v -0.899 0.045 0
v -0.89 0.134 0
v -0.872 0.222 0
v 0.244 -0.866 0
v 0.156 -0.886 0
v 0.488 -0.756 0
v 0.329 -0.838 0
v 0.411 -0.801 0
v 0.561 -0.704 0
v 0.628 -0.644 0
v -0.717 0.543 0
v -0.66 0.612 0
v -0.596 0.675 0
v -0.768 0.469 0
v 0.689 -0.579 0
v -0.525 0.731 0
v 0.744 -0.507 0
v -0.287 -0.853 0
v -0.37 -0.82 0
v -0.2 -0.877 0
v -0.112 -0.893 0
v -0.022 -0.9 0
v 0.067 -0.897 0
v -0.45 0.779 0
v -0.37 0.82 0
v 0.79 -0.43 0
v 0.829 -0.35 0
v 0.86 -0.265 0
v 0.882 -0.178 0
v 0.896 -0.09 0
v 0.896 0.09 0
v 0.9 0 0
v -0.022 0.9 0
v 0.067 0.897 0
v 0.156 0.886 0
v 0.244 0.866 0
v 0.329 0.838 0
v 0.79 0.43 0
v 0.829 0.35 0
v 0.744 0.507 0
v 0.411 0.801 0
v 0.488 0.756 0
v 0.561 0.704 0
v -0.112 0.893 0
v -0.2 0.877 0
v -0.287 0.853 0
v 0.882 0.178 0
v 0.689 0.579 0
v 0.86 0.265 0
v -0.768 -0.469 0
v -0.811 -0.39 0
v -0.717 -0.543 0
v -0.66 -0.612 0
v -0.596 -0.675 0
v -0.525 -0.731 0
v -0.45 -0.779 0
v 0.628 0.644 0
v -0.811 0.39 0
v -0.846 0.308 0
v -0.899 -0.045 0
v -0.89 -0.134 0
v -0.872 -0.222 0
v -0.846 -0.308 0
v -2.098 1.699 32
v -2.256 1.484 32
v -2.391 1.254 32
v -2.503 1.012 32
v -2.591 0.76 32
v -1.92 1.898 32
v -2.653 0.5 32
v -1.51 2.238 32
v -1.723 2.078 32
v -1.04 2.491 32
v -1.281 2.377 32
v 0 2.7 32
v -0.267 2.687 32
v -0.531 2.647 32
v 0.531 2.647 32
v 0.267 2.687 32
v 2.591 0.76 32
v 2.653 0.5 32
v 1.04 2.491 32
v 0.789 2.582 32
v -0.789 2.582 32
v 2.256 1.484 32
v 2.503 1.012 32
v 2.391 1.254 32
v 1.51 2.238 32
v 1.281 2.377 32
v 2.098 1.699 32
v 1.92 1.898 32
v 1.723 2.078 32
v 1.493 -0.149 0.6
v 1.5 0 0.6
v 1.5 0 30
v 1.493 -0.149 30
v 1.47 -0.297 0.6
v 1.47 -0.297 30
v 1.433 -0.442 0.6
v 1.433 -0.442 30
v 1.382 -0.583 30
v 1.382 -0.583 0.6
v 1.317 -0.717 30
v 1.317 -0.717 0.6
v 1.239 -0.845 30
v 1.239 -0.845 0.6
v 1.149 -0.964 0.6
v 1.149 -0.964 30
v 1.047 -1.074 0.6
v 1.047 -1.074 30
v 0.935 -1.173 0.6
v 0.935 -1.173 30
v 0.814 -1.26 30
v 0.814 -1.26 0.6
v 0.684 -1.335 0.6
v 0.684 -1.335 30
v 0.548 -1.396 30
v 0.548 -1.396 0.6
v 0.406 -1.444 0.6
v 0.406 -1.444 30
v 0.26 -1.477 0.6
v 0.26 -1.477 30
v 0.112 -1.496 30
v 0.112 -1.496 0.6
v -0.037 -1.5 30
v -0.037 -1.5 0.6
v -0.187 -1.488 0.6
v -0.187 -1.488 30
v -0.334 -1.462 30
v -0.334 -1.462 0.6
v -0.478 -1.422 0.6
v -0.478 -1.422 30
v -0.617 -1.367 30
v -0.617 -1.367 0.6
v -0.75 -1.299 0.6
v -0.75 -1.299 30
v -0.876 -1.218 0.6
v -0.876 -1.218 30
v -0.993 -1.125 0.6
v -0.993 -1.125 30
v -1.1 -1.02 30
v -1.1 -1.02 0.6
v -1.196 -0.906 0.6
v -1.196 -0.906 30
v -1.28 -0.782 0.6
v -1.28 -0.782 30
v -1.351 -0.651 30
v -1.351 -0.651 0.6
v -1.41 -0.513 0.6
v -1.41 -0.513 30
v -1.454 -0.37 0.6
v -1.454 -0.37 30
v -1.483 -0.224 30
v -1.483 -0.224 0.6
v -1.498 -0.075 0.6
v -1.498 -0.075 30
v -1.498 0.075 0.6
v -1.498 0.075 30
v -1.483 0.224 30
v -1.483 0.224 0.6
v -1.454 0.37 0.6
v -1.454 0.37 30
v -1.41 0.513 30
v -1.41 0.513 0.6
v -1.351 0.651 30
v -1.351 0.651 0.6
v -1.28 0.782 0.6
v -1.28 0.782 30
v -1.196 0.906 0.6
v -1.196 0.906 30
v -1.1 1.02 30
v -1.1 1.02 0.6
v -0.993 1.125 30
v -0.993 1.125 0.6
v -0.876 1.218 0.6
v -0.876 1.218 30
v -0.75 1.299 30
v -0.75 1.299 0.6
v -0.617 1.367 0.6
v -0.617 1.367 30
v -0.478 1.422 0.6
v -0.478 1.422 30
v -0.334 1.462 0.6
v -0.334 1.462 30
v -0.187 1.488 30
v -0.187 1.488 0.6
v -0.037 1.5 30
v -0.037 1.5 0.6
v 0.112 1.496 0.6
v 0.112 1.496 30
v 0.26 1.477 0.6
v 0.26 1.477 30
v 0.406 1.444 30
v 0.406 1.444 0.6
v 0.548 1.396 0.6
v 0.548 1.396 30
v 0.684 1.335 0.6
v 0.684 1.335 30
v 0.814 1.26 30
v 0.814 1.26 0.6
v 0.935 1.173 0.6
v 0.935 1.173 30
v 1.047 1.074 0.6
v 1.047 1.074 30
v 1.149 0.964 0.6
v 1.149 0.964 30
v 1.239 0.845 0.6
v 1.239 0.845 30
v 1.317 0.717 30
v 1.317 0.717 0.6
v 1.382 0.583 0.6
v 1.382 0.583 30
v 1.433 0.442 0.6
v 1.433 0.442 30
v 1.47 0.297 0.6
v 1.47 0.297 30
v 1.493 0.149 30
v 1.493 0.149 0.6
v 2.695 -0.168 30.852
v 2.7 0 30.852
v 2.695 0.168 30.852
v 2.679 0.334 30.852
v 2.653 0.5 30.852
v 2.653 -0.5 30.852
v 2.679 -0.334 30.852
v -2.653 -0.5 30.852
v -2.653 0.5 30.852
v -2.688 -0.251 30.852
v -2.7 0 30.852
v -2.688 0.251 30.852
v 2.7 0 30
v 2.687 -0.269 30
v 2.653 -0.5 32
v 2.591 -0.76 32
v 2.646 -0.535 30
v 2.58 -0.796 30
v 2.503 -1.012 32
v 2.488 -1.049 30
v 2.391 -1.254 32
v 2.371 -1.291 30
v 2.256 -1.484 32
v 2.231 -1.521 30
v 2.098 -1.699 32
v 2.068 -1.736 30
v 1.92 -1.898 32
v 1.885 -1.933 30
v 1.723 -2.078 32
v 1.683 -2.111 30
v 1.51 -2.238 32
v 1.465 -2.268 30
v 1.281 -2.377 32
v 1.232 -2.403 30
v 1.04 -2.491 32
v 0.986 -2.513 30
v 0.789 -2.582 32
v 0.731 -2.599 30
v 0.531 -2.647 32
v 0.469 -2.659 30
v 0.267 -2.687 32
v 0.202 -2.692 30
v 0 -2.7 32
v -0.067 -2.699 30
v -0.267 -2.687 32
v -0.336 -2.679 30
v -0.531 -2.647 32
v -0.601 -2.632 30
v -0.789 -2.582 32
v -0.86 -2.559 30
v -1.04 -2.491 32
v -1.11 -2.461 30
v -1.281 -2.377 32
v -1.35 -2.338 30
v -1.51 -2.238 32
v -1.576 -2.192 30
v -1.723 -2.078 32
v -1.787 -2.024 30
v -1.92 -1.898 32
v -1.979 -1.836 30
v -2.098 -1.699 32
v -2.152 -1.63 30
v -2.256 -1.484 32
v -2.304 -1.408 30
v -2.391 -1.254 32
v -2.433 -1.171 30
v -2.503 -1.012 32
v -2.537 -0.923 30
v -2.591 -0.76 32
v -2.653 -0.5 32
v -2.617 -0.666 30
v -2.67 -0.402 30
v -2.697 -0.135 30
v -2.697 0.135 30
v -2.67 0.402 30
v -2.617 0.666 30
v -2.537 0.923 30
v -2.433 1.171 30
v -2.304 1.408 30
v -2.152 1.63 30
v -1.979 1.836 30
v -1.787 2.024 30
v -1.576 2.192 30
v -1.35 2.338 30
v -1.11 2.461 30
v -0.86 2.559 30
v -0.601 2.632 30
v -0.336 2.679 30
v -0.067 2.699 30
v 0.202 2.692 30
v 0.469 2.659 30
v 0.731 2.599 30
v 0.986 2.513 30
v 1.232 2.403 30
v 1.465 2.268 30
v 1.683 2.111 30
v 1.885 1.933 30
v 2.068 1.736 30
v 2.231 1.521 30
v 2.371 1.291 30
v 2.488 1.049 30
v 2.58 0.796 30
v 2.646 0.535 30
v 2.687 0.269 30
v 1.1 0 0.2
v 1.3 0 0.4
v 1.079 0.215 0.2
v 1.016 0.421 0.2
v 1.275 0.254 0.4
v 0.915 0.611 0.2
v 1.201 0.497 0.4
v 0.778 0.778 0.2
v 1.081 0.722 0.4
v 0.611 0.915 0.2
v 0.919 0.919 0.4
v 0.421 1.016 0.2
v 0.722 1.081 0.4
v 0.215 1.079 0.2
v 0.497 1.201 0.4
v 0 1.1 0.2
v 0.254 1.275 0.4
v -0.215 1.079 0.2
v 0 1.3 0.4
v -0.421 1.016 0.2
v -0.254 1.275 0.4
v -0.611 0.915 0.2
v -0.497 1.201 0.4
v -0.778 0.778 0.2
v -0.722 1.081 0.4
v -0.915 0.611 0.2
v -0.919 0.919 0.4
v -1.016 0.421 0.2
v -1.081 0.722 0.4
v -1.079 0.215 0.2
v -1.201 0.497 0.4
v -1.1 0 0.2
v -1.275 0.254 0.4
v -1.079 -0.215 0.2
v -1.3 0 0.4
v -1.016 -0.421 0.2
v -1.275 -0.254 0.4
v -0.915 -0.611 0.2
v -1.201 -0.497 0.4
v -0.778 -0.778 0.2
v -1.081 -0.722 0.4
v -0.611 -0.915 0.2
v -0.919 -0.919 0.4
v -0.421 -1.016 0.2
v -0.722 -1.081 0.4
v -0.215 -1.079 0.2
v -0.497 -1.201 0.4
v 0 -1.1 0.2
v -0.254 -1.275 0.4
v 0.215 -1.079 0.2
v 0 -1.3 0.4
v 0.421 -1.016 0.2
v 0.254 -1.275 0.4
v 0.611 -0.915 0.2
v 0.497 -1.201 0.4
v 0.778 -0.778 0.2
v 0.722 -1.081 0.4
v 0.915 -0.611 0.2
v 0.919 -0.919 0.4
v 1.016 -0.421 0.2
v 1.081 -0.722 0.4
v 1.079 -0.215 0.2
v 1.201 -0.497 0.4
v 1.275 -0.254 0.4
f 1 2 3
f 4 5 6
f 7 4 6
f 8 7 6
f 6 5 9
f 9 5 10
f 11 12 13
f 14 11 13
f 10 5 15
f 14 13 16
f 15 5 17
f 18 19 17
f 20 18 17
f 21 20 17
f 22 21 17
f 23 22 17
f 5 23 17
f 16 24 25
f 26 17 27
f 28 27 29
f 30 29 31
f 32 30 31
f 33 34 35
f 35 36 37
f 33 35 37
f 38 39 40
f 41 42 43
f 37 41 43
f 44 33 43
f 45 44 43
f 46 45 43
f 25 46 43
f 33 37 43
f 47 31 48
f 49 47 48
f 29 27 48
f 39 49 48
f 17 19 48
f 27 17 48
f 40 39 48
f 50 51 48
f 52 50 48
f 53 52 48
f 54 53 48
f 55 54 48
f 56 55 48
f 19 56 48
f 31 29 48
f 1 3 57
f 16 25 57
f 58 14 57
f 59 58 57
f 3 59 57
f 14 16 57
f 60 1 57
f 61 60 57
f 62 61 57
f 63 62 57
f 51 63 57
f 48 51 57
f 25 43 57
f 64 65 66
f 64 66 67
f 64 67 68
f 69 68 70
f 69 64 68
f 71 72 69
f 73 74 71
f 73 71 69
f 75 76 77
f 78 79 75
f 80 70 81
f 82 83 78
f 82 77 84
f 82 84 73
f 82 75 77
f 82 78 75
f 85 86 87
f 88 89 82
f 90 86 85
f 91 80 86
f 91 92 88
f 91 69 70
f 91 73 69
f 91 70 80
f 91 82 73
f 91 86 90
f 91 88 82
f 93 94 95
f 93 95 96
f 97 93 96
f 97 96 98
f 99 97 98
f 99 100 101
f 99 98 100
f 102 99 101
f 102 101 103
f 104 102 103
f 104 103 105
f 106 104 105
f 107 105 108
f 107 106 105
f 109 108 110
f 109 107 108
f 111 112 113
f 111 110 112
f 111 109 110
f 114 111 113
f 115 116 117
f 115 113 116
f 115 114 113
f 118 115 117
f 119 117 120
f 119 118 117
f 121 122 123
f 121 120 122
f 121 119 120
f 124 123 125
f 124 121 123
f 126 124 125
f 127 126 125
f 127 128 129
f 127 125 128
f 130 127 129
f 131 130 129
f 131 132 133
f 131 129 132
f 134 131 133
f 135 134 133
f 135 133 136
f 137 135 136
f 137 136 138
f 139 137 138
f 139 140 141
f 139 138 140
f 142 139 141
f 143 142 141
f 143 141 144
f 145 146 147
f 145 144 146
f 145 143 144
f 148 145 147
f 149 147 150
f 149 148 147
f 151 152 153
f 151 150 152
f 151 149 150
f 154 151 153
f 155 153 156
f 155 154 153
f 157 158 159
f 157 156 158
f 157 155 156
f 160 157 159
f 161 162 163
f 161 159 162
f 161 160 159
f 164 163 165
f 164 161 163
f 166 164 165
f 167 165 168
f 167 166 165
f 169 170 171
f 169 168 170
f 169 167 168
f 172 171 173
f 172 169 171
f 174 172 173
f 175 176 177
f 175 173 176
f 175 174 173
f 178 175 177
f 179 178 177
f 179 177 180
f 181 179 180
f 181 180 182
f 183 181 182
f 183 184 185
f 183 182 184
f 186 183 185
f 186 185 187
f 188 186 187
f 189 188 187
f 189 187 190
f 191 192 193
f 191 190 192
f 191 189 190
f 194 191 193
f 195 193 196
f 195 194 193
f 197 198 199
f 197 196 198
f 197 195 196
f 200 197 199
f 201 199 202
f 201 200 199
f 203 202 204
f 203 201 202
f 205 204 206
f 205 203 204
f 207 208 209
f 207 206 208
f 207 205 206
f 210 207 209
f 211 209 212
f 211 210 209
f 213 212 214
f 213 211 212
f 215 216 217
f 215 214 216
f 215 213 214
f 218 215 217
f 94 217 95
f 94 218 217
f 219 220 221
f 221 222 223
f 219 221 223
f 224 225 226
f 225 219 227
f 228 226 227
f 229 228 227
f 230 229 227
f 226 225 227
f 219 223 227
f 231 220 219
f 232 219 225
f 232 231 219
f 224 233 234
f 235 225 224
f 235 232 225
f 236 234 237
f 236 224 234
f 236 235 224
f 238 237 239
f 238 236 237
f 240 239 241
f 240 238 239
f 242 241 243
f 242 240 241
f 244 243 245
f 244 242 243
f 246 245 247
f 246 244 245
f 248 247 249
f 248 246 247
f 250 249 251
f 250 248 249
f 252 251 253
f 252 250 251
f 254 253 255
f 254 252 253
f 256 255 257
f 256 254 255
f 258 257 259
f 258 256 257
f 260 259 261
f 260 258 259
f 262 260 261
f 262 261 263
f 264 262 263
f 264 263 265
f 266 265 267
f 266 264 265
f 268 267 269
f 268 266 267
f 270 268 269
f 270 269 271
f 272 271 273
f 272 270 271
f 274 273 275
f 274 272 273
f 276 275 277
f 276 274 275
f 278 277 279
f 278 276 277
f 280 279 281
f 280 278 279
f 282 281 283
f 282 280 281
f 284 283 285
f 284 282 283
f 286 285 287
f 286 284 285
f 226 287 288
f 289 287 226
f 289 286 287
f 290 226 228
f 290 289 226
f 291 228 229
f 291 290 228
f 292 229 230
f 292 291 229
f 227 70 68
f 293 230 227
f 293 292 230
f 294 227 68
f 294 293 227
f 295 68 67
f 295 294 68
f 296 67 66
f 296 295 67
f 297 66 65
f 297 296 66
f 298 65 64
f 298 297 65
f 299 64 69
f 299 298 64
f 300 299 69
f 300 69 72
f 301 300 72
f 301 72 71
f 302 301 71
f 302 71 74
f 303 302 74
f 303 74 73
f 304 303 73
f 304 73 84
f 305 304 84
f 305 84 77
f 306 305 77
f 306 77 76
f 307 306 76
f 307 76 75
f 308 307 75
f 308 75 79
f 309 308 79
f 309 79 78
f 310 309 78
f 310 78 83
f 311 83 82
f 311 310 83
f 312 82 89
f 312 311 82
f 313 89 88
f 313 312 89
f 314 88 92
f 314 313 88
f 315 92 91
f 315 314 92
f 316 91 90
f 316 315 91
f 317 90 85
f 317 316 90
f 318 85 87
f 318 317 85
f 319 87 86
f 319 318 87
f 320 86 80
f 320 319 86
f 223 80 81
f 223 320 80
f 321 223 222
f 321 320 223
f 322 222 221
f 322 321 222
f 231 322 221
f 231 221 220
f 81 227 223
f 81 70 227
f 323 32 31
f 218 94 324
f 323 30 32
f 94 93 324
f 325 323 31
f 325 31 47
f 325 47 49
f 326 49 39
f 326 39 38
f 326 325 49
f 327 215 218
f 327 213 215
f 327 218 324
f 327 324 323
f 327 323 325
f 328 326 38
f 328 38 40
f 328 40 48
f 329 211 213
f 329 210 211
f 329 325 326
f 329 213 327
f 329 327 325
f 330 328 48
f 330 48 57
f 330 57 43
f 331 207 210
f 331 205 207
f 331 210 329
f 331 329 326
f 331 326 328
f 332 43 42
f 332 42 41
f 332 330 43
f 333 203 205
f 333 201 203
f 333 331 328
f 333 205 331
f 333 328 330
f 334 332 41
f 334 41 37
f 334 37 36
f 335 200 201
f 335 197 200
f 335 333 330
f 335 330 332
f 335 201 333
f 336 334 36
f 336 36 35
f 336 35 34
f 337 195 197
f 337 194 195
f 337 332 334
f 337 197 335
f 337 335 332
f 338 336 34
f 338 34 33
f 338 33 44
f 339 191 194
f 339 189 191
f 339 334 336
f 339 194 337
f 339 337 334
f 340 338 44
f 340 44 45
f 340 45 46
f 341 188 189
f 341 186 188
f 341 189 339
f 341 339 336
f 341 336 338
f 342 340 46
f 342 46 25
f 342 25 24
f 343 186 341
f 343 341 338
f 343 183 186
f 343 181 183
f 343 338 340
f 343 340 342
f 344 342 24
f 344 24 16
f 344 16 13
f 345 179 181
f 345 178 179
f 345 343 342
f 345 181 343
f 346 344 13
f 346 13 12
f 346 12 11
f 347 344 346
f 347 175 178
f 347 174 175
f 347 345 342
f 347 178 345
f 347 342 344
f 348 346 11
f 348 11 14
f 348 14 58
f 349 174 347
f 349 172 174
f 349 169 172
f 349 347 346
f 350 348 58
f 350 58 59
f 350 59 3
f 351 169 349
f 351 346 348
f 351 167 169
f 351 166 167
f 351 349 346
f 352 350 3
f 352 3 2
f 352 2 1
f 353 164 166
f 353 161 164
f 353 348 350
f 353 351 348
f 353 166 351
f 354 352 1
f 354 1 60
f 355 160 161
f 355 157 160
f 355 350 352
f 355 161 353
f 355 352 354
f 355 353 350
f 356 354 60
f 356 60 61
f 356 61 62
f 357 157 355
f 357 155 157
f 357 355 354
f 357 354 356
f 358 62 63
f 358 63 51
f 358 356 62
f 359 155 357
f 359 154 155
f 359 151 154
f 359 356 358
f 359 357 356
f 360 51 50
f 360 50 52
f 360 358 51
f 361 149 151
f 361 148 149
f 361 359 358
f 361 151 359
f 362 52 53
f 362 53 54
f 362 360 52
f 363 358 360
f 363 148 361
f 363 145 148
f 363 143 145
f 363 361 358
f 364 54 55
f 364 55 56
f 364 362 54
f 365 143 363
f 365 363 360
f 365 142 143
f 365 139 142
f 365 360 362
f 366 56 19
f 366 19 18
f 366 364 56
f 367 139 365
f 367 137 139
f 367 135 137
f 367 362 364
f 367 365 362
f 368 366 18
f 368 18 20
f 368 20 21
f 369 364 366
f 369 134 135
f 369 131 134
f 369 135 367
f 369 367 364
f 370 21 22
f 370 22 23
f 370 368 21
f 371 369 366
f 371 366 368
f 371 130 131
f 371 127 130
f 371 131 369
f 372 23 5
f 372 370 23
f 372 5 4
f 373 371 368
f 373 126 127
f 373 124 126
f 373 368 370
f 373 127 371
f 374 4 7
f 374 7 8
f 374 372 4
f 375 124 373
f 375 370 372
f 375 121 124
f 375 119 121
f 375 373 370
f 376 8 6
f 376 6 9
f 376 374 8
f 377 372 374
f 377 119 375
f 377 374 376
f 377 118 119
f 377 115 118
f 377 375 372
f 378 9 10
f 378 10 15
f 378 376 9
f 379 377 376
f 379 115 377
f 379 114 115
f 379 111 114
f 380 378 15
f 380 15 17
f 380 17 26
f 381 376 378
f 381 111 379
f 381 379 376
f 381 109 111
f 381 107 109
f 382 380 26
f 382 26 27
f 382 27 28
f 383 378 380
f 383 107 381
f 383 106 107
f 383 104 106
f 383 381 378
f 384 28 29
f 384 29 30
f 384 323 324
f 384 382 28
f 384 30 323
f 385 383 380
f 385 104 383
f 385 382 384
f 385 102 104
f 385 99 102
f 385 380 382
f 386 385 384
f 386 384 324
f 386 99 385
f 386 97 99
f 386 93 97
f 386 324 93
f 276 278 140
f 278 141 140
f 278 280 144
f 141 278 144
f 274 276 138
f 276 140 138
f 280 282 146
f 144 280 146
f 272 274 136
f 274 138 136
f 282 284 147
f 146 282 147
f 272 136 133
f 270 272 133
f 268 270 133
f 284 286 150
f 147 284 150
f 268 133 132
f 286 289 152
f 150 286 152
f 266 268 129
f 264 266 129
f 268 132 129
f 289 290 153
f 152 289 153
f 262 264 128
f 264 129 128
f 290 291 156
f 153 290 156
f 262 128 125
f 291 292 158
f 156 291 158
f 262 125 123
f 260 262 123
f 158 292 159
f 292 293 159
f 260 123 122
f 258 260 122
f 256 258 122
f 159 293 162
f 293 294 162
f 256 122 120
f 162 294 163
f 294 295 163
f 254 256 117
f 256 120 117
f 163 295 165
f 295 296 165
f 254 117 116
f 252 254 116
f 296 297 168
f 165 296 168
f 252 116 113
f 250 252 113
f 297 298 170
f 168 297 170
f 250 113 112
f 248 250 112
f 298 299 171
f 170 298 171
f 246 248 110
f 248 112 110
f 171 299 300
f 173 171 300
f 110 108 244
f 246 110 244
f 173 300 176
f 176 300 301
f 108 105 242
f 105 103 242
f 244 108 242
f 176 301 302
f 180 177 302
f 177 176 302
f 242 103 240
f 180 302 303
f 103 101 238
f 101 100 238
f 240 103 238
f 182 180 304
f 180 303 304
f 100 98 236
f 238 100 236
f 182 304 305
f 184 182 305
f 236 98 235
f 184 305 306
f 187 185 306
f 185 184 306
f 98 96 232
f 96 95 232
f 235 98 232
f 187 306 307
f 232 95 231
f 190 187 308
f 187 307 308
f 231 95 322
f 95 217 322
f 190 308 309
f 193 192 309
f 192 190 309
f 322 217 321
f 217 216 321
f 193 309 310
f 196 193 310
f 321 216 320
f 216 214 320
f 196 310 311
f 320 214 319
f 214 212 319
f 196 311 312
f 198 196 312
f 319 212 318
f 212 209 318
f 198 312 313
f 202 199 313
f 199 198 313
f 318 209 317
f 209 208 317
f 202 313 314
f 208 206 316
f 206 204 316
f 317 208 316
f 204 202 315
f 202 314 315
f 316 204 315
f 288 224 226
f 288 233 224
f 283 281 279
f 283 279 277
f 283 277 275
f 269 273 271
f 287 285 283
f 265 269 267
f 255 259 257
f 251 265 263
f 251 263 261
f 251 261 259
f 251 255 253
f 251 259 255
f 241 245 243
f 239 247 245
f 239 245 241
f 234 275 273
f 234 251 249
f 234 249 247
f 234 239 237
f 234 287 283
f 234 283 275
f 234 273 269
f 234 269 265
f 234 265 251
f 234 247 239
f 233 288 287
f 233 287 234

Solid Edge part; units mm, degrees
sketch "Sketch1" plane through (0, 0, 0) normal (0, 0, 1) x (1, 0, 0)
  circle A0 centre (0, 0) radius 1.5
  dimension "D1" = 3
extrude "Protrusion1" add sketch "Sketch1" along normal blind 30
chamfer "Chaflán_1" distance 0.6 angle 45 1 edges at (-1.5, 0, 0)
sketch "Sketch2" plane through (0, 0, 30) normal (0, 0, 1) x (1, 0, 0)
  circle A0 centre (0, 0) radius 2.7
  dimension "D1" = 5.4
extrude "ProtrusiónExtruida_3" add sketch "Sketch2" along normal blind 2
sketch "Sketch3" plane through (0, 0, 32) normal (0, 0, 1) x (0, 1, 0)
  line L0 (0.5, -3.2084) -> (-0.5, -3.2084)
  line L1 (-0.5, -3.2084) -> (-0.5, 3.2084)
  line L2 (-0.5, 3.2084) -> (0.5, 3.2084)
  line L3 (0.5, 3.2084) -> (0.5, -3.2084)
  dimension "D1" = 0.5
extrude "VaciadoExtruido_5" cut sketch "Sketch3" against normal blind 1.148
properties material "Acero inoxidable, 303"
